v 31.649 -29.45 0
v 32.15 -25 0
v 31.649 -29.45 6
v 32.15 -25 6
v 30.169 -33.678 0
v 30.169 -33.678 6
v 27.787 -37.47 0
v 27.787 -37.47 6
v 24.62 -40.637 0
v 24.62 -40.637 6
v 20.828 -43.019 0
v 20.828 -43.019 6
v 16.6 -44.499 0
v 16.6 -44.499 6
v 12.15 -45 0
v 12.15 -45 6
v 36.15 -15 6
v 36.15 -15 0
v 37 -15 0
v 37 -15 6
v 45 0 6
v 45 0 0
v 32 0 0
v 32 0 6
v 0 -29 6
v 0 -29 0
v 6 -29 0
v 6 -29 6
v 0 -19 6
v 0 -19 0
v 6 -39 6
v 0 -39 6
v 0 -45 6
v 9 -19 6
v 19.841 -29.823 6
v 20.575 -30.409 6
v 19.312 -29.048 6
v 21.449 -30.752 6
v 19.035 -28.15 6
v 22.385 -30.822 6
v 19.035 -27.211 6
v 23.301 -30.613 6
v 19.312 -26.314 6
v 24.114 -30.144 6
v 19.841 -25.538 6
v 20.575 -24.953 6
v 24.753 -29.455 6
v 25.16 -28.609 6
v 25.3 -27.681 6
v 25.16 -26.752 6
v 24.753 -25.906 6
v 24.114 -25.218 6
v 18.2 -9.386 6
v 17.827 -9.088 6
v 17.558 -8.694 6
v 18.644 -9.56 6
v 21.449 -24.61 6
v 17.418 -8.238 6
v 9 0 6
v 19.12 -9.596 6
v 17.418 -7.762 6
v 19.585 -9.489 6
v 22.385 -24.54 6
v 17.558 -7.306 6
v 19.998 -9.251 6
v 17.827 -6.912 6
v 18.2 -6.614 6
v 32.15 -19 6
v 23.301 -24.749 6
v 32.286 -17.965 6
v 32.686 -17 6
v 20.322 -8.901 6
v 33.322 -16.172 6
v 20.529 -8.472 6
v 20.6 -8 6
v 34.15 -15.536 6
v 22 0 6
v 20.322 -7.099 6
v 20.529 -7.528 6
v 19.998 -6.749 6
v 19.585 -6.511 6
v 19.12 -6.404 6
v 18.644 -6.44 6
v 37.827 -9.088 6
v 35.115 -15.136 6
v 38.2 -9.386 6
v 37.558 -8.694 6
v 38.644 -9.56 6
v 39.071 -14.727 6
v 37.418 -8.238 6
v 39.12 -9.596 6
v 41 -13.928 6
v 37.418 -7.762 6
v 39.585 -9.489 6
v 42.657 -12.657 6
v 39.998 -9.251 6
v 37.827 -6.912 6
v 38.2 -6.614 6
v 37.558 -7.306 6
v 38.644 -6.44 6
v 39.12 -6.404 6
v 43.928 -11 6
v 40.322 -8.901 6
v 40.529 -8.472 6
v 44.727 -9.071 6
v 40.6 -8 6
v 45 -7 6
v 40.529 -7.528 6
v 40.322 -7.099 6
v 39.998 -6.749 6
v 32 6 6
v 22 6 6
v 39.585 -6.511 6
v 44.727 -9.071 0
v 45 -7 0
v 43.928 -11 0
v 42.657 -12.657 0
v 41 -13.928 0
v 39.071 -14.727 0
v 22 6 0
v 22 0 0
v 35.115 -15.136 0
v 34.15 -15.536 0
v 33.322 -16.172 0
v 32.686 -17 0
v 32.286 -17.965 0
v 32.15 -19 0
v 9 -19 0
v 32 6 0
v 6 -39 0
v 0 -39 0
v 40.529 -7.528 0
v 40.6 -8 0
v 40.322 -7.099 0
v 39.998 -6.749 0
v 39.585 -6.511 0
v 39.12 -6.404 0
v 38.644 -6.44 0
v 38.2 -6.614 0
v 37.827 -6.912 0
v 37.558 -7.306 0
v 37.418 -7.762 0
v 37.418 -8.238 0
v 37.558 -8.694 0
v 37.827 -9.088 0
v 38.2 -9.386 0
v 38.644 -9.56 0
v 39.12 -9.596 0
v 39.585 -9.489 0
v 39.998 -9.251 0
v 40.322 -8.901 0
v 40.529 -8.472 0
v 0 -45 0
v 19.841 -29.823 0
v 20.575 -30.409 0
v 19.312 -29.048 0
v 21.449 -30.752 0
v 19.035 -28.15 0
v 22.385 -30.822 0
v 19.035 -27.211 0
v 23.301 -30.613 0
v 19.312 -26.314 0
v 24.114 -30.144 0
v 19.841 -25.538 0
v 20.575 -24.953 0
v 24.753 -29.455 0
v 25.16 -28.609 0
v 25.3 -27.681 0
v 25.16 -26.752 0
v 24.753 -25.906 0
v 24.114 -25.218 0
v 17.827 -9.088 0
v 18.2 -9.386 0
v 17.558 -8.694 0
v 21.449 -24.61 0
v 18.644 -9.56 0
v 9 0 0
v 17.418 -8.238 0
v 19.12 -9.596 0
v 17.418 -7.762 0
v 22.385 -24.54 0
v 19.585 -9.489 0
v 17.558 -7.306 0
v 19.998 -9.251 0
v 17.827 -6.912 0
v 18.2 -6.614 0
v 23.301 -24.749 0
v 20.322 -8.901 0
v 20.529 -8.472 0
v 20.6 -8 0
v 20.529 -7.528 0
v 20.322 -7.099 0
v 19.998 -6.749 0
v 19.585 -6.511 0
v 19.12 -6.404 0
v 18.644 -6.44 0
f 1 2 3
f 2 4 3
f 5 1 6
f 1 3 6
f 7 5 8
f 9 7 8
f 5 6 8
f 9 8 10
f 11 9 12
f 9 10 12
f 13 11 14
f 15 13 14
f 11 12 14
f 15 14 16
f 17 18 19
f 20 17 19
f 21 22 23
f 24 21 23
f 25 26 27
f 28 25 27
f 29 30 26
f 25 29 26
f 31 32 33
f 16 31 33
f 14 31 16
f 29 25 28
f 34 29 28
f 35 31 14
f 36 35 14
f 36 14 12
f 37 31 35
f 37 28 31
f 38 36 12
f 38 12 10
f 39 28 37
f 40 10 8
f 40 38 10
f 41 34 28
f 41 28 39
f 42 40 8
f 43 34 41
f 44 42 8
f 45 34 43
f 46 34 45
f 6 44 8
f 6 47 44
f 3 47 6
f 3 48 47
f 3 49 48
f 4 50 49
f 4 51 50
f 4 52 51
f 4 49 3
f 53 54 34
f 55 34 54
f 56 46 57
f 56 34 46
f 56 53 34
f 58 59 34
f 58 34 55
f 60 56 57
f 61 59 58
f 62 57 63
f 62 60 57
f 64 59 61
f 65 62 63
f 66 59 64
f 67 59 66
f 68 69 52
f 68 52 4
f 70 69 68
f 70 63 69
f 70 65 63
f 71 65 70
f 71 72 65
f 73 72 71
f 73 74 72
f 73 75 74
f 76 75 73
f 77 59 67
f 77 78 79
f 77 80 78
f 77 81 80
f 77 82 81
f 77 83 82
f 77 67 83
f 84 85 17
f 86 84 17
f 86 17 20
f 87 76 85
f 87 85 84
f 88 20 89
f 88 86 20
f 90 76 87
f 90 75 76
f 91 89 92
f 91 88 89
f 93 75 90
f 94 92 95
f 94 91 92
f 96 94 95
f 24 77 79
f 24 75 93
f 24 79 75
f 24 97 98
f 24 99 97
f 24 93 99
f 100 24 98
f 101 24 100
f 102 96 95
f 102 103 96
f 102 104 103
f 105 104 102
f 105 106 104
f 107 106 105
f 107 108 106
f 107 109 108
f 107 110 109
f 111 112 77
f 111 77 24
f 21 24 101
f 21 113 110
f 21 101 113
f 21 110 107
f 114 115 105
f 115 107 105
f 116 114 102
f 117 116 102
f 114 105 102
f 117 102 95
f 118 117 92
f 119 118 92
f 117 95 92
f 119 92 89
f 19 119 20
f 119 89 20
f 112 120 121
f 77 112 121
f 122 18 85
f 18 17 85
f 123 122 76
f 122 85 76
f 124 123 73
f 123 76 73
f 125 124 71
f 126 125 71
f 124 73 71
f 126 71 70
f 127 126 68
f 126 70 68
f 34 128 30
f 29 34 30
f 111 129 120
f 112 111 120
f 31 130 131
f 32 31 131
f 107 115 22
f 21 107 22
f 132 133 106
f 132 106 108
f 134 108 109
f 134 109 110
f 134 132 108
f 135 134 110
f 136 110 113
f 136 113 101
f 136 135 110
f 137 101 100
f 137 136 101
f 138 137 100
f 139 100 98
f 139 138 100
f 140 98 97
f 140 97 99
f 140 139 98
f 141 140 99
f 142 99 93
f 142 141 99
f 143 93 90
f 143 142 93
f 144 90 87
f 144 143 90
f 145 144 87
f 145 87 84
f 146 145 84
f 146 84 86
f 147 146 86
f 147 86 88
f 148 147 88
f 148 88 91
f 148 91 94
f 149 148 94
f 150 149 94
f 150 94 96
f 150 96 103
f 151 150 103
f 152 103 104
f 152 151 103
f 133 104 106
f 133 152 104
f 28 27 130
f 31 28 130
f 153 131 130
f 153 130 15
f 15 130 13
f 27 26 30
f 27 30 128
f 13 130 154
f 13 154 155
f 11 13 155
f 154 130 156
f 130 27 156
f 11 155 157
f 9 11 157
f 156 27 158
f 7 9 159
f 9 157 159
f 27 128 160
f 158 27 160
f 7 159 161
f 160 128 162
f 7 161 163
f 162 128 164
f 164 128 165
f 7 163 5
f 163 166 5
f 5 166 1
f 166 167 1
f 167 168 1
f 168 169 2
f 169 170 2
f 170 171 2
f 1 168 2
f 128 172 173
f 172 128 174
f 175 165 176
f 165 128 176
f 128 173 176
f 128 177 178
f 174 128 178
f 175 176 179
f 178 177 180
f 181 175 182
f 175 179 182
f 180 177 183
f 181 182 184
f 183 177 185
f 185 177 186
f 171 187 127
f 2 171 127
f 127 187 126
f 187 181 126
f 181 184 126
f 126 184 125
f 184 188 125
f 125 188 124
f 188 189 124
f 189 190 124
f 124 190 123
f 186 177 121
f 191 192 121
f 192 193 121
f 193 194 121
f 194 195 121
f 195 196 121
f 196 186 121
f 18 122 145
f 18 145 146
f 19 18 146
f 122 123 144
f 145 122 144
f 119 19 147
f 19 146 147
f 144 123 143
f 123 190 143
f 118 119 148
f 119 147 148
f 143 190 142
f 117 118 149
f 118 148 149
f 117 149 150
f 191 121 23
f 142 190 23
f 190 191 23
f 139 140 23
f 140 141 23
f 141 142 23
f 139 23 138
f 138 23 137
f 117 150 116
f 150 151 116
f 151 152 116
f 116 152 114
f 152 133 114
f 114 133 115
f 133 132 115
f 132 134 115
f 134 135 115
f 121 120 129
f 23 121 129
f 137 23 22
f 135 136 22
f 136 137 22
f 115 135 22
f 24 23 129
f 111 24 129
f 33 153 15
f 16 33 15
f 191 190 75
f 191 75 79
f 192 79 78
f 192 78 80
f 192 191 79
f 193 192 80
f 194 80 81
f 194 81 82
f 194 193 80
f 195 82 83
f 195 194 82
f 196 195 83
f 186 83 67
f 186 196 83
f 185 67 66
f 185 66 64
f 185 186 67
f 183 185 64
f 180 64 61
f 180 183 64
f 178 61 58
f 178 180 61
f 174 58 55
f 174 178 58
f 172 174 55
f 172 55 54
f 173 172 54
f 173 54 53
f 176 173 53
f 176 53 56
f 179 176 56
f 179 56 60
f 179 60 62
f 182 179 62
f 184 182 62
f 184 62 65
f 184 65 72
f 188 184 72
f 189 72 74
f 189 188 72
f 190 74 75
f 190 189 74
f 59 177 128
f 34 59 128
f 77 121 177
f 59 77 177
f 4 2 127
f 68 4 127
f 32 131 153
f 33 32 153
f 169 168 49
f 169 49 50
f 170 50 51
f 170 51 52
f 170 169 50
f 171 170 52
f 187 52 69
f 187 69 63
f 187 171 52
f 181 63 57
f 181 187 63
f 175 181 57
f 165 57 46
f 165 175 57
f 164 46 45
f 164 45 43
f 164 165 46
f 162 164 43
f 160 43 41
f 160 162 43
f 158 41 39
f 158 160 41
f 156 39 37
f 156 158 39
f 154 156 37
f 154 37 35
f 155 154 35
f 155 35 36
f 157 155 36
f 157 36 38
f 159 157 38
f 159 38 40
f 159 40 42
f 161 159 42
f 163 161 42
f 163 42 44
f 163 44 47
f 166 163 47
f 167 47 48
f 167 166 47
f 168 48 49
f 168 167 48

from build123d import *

# Parameters (mm, degrees)
ESBO_O1_R                = 3.15
ESBO_O1_R_2              = 1.6
RESSALTO_EXTRUS_O1_DEPTH = 6
FILETE2_R                = 8
FILETE3_R                = 4
FILETE4_R                = 20


with BuildPart() as part:
    # Esboço1 → Ressalto-extrusão1 (new body)
    with BuildSketch(Plane.XY):
        Polygon((22, 0), (9, 0), (9, -19), (0, -19), (0, -29), (6, -29), (6, -39), (0, -39), (0, -45), (32.15, -45), (32.15, -15), (45, -15), (45, 0), (32, 0), (32, 6), (22, 6), align=None)
        with Locations((22.15, -27.680849585)):
            Circle(ESBO_O1_R, mode=Mode.SUBTRACT)
        with Locations((19, -8)):
            Circle(ESBO_O1_R_2, mode=Mode.SUBTRACT)
        with Locations((39, -8)):
            Circle(ESBO_O1_R_2, mode=Mode.SUBTRACT)
    extrude(amount=RESSALTO_EXTRUS_O1_DEPTH)

    # Filete2
    filete2_edges = [part.edges().sort_by_distance(p)[0] for p in [
        (45, -15, 3),
    ]]
    fillet(filete2_edges, radius=FILETE2_R)

    # Filete3
    filete3_edges = [part.edges().sort_by_distance(p)[0] for p in [
        (32.15, -15, 3),
    ]]
    fillet(filete3_edges, radius=FILETE3_R)

    # Filete4
    filete4_edges = [part.edges().sort_by_distance(p)[0] for p in [
        (32.15, -45, 3),
    ]]
    fillet(filete4_edges, radius=FILETE4_R)


solid = part.part
